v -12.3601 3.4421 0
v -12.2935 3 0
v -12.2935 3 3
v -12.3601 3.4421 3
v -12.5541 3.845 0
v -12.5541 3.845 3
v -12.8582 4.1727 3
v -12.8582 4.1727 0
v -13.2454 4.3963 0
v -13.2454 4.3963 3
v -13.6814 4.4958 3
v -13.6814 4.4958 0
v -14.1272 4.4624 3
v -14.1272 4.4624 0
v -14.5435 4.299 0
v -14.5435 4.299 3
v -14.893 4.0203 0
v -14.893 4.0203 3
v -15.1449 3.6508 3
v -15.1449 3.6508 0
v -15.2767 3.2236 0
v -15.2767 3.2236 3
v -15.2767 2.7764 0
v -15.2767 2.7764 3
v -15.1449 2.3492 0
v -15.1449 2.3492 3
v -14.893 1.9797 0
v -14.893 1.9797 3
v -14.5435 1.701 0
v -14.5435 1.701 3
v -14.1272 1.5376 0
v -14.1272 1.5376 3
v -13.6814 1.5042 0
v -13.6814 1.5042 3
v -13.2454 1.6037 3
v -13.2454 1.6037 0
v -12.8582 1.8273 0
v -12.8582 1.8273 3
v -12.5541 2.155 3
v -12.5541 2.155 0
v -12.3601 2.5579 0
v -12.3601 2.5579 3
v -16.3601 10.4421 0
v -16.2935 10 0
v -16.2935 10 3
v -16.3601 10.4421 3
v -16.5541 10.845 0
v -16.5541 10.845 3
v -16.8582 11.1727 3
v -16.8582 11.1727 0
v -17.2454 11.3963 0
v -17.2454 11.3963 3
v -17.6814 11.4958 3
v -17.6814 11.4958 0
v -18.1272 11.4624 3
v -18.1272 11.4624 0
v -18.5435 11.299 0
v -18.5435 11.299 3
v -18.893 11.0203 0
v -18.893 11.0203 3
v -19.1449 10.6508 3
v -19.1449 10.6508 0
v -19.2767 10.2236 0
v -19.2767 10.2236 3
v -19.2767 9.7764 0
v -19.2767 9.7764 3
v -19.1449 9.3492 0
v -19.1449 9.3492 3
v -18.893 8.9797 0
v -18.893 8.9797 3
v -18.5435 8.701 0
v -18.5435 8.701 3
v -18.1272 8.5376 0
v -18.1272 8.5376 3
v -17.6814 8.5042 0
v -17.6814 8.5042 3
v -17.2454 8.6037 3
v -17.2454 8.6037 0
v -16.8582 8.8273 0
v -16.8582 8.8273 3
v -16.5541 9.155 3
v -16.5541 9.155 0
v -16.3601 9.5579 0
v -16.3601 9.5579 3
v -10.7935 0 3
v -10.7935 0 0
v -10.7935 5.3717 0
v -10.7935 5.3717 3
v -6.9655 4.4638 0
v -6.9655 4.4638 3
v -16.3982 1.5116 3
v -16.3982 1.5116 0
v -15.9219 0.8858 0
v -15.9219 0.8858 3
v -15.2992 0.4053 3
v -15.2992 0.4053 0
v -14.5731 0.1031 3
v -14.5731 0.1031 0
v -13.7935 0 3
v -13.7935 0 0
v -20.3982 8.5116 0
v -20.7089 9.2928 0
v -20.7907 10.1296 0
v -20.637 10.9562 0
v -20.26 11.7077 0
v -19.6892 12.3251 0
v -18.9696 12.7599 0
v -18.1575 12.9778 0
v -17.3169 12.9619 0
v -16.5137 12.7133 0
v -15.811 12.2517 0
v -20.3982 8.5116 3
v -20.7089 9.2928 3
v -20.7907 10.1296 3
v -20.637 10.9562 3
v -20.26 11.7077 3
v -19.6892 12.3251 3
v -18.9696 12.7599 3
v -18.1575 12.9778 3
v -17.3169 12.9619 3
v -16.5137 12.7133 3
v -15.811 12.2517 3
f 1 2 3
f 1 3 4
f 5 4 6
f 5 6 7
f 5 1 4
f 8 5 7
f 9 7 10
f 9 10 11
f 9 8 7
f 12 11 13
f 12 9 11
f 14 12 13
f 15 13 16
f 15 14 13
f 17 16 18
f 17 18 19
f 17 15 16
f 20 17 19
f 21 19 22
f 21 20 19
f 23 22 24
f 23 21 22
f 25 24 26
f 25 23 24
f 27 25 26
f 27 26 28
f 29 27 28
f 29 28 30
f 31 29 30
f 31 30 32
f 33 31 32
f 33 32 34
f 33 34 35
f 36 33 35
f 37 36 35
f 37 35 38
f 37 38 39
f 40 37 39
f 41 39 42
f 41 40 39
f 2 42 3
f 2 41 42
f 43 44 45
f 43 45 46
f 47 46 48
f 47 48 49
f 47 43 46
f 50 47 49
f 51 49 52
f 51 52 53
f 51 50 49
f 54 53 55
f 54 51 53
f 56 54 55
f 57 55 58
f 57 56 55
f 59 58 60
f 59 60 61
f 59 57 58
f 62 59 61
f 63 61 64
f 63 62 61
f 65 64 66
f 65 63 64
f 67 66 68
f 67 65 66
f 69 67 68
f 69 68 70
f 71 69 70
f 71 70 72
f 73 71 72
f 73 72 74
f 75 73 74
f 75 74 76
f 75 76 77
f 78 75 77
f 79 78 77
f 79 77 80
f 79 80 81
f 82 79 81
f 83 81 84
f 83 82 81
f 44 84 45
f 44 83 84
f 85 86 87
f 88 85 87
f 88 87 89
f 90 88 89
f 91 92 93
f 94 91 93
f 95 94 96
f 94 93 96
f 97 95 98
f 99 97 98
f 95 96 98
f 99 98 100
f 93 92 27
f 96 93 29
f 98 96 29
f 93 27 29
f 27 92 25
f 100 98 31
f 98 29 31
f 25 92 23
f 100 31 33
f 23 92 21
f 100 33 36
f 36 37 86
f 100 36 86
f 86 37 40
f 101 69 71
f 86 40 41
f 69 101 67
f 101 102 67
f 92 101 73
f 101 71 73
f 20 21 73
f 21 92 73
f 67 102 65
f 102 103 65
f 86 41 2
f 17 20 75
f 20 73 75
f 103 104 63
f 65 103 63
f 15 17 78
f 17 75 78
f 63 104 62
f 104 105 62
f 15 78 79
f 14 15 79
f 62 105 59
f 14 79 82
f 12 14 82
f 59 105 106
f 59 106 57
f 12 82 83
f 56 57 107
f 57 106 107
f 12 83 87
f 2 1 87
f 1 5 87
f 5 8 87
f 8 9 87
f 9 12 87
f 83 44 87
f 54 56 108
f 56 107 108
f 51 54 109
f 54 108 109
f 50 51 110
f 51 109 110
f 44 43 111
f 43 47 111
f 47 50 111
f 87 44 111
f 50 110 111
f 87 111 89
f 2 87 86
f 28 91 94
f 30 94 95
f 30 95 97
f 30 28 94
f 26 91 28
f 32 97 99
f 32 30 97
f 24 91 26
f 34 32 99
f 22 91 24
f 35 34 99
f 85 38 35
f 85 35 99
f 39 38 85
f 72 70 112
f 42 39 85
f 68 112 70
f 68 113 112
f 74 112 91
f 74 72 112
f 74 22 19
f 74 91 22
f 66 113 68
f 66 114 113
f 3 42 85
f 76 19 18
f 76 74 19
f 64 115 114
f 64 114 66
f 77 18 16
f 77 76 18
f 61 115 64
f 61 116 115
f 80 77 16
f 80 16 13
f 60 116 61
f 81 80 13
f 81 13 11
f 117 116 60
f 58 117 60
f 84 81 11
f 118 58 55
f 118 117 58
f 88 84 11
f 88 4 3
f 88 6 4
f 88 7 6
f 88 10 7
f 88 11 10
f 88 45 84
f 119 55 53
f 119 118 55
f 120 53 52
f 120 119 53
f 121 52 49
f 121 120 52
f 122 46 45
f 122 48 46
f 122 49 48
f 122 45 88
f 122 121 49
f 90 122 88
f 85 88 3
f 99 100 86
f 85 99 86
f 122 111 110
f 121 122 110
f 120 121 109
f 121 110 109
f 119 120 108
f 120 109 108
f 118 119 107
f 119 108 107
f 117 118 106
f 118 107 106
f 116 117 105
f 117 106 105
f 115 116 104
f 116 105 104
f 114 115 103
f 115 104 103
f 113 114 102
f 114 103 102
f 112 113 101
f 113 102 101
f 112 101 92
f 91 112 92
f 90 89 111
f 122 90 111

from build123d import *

# Parameters (mm, degrees)
SKETCH1_R           = 1.5
BOSS_EXTRUDE1_DEPTH = 3


with BuildPart() as part:
    # Sketch1 → Boss-Extrude1 (new body)
    with BuildSketch(Plane.XY):
        with BuildLine():
            Line((-20.398188463, 8.511583185), (-16.398188463, 1.511583185))
            ThreePointArc((-16.398188463, 1.511583185), (-15.299239491, 0.405269721), (-13.793459037, 0))
            Line((-13.793459037, 0), (-10.793459037, 0))
            Line((-10.793459037, 0), (-10.793459037, 5.371708245))
            Line((-10.793459037, 5.371708245), (-6.965474487, 4.463821993))
            Line((-6.965474487, 4.463821993), (-15.811037483, 12.251667113))
            ThreePointArc((-15.811037483, 12.251667113), (-19.689210528, 12.3251078), (-20.398188463, 8.511583185))
        make_face()
        with Locations((-17.793459037, 10)):
            Circle(SKETCH1_R, mode=Mode.SUBTRACT)
        with Locations((-13.793459037, 3)):
            Circle(SKETCH1_R, mode=Mode.SUBTRACT)
    extrude(amount=BOSS_EXTRUDE1_DEPTH)


solid = part.part
